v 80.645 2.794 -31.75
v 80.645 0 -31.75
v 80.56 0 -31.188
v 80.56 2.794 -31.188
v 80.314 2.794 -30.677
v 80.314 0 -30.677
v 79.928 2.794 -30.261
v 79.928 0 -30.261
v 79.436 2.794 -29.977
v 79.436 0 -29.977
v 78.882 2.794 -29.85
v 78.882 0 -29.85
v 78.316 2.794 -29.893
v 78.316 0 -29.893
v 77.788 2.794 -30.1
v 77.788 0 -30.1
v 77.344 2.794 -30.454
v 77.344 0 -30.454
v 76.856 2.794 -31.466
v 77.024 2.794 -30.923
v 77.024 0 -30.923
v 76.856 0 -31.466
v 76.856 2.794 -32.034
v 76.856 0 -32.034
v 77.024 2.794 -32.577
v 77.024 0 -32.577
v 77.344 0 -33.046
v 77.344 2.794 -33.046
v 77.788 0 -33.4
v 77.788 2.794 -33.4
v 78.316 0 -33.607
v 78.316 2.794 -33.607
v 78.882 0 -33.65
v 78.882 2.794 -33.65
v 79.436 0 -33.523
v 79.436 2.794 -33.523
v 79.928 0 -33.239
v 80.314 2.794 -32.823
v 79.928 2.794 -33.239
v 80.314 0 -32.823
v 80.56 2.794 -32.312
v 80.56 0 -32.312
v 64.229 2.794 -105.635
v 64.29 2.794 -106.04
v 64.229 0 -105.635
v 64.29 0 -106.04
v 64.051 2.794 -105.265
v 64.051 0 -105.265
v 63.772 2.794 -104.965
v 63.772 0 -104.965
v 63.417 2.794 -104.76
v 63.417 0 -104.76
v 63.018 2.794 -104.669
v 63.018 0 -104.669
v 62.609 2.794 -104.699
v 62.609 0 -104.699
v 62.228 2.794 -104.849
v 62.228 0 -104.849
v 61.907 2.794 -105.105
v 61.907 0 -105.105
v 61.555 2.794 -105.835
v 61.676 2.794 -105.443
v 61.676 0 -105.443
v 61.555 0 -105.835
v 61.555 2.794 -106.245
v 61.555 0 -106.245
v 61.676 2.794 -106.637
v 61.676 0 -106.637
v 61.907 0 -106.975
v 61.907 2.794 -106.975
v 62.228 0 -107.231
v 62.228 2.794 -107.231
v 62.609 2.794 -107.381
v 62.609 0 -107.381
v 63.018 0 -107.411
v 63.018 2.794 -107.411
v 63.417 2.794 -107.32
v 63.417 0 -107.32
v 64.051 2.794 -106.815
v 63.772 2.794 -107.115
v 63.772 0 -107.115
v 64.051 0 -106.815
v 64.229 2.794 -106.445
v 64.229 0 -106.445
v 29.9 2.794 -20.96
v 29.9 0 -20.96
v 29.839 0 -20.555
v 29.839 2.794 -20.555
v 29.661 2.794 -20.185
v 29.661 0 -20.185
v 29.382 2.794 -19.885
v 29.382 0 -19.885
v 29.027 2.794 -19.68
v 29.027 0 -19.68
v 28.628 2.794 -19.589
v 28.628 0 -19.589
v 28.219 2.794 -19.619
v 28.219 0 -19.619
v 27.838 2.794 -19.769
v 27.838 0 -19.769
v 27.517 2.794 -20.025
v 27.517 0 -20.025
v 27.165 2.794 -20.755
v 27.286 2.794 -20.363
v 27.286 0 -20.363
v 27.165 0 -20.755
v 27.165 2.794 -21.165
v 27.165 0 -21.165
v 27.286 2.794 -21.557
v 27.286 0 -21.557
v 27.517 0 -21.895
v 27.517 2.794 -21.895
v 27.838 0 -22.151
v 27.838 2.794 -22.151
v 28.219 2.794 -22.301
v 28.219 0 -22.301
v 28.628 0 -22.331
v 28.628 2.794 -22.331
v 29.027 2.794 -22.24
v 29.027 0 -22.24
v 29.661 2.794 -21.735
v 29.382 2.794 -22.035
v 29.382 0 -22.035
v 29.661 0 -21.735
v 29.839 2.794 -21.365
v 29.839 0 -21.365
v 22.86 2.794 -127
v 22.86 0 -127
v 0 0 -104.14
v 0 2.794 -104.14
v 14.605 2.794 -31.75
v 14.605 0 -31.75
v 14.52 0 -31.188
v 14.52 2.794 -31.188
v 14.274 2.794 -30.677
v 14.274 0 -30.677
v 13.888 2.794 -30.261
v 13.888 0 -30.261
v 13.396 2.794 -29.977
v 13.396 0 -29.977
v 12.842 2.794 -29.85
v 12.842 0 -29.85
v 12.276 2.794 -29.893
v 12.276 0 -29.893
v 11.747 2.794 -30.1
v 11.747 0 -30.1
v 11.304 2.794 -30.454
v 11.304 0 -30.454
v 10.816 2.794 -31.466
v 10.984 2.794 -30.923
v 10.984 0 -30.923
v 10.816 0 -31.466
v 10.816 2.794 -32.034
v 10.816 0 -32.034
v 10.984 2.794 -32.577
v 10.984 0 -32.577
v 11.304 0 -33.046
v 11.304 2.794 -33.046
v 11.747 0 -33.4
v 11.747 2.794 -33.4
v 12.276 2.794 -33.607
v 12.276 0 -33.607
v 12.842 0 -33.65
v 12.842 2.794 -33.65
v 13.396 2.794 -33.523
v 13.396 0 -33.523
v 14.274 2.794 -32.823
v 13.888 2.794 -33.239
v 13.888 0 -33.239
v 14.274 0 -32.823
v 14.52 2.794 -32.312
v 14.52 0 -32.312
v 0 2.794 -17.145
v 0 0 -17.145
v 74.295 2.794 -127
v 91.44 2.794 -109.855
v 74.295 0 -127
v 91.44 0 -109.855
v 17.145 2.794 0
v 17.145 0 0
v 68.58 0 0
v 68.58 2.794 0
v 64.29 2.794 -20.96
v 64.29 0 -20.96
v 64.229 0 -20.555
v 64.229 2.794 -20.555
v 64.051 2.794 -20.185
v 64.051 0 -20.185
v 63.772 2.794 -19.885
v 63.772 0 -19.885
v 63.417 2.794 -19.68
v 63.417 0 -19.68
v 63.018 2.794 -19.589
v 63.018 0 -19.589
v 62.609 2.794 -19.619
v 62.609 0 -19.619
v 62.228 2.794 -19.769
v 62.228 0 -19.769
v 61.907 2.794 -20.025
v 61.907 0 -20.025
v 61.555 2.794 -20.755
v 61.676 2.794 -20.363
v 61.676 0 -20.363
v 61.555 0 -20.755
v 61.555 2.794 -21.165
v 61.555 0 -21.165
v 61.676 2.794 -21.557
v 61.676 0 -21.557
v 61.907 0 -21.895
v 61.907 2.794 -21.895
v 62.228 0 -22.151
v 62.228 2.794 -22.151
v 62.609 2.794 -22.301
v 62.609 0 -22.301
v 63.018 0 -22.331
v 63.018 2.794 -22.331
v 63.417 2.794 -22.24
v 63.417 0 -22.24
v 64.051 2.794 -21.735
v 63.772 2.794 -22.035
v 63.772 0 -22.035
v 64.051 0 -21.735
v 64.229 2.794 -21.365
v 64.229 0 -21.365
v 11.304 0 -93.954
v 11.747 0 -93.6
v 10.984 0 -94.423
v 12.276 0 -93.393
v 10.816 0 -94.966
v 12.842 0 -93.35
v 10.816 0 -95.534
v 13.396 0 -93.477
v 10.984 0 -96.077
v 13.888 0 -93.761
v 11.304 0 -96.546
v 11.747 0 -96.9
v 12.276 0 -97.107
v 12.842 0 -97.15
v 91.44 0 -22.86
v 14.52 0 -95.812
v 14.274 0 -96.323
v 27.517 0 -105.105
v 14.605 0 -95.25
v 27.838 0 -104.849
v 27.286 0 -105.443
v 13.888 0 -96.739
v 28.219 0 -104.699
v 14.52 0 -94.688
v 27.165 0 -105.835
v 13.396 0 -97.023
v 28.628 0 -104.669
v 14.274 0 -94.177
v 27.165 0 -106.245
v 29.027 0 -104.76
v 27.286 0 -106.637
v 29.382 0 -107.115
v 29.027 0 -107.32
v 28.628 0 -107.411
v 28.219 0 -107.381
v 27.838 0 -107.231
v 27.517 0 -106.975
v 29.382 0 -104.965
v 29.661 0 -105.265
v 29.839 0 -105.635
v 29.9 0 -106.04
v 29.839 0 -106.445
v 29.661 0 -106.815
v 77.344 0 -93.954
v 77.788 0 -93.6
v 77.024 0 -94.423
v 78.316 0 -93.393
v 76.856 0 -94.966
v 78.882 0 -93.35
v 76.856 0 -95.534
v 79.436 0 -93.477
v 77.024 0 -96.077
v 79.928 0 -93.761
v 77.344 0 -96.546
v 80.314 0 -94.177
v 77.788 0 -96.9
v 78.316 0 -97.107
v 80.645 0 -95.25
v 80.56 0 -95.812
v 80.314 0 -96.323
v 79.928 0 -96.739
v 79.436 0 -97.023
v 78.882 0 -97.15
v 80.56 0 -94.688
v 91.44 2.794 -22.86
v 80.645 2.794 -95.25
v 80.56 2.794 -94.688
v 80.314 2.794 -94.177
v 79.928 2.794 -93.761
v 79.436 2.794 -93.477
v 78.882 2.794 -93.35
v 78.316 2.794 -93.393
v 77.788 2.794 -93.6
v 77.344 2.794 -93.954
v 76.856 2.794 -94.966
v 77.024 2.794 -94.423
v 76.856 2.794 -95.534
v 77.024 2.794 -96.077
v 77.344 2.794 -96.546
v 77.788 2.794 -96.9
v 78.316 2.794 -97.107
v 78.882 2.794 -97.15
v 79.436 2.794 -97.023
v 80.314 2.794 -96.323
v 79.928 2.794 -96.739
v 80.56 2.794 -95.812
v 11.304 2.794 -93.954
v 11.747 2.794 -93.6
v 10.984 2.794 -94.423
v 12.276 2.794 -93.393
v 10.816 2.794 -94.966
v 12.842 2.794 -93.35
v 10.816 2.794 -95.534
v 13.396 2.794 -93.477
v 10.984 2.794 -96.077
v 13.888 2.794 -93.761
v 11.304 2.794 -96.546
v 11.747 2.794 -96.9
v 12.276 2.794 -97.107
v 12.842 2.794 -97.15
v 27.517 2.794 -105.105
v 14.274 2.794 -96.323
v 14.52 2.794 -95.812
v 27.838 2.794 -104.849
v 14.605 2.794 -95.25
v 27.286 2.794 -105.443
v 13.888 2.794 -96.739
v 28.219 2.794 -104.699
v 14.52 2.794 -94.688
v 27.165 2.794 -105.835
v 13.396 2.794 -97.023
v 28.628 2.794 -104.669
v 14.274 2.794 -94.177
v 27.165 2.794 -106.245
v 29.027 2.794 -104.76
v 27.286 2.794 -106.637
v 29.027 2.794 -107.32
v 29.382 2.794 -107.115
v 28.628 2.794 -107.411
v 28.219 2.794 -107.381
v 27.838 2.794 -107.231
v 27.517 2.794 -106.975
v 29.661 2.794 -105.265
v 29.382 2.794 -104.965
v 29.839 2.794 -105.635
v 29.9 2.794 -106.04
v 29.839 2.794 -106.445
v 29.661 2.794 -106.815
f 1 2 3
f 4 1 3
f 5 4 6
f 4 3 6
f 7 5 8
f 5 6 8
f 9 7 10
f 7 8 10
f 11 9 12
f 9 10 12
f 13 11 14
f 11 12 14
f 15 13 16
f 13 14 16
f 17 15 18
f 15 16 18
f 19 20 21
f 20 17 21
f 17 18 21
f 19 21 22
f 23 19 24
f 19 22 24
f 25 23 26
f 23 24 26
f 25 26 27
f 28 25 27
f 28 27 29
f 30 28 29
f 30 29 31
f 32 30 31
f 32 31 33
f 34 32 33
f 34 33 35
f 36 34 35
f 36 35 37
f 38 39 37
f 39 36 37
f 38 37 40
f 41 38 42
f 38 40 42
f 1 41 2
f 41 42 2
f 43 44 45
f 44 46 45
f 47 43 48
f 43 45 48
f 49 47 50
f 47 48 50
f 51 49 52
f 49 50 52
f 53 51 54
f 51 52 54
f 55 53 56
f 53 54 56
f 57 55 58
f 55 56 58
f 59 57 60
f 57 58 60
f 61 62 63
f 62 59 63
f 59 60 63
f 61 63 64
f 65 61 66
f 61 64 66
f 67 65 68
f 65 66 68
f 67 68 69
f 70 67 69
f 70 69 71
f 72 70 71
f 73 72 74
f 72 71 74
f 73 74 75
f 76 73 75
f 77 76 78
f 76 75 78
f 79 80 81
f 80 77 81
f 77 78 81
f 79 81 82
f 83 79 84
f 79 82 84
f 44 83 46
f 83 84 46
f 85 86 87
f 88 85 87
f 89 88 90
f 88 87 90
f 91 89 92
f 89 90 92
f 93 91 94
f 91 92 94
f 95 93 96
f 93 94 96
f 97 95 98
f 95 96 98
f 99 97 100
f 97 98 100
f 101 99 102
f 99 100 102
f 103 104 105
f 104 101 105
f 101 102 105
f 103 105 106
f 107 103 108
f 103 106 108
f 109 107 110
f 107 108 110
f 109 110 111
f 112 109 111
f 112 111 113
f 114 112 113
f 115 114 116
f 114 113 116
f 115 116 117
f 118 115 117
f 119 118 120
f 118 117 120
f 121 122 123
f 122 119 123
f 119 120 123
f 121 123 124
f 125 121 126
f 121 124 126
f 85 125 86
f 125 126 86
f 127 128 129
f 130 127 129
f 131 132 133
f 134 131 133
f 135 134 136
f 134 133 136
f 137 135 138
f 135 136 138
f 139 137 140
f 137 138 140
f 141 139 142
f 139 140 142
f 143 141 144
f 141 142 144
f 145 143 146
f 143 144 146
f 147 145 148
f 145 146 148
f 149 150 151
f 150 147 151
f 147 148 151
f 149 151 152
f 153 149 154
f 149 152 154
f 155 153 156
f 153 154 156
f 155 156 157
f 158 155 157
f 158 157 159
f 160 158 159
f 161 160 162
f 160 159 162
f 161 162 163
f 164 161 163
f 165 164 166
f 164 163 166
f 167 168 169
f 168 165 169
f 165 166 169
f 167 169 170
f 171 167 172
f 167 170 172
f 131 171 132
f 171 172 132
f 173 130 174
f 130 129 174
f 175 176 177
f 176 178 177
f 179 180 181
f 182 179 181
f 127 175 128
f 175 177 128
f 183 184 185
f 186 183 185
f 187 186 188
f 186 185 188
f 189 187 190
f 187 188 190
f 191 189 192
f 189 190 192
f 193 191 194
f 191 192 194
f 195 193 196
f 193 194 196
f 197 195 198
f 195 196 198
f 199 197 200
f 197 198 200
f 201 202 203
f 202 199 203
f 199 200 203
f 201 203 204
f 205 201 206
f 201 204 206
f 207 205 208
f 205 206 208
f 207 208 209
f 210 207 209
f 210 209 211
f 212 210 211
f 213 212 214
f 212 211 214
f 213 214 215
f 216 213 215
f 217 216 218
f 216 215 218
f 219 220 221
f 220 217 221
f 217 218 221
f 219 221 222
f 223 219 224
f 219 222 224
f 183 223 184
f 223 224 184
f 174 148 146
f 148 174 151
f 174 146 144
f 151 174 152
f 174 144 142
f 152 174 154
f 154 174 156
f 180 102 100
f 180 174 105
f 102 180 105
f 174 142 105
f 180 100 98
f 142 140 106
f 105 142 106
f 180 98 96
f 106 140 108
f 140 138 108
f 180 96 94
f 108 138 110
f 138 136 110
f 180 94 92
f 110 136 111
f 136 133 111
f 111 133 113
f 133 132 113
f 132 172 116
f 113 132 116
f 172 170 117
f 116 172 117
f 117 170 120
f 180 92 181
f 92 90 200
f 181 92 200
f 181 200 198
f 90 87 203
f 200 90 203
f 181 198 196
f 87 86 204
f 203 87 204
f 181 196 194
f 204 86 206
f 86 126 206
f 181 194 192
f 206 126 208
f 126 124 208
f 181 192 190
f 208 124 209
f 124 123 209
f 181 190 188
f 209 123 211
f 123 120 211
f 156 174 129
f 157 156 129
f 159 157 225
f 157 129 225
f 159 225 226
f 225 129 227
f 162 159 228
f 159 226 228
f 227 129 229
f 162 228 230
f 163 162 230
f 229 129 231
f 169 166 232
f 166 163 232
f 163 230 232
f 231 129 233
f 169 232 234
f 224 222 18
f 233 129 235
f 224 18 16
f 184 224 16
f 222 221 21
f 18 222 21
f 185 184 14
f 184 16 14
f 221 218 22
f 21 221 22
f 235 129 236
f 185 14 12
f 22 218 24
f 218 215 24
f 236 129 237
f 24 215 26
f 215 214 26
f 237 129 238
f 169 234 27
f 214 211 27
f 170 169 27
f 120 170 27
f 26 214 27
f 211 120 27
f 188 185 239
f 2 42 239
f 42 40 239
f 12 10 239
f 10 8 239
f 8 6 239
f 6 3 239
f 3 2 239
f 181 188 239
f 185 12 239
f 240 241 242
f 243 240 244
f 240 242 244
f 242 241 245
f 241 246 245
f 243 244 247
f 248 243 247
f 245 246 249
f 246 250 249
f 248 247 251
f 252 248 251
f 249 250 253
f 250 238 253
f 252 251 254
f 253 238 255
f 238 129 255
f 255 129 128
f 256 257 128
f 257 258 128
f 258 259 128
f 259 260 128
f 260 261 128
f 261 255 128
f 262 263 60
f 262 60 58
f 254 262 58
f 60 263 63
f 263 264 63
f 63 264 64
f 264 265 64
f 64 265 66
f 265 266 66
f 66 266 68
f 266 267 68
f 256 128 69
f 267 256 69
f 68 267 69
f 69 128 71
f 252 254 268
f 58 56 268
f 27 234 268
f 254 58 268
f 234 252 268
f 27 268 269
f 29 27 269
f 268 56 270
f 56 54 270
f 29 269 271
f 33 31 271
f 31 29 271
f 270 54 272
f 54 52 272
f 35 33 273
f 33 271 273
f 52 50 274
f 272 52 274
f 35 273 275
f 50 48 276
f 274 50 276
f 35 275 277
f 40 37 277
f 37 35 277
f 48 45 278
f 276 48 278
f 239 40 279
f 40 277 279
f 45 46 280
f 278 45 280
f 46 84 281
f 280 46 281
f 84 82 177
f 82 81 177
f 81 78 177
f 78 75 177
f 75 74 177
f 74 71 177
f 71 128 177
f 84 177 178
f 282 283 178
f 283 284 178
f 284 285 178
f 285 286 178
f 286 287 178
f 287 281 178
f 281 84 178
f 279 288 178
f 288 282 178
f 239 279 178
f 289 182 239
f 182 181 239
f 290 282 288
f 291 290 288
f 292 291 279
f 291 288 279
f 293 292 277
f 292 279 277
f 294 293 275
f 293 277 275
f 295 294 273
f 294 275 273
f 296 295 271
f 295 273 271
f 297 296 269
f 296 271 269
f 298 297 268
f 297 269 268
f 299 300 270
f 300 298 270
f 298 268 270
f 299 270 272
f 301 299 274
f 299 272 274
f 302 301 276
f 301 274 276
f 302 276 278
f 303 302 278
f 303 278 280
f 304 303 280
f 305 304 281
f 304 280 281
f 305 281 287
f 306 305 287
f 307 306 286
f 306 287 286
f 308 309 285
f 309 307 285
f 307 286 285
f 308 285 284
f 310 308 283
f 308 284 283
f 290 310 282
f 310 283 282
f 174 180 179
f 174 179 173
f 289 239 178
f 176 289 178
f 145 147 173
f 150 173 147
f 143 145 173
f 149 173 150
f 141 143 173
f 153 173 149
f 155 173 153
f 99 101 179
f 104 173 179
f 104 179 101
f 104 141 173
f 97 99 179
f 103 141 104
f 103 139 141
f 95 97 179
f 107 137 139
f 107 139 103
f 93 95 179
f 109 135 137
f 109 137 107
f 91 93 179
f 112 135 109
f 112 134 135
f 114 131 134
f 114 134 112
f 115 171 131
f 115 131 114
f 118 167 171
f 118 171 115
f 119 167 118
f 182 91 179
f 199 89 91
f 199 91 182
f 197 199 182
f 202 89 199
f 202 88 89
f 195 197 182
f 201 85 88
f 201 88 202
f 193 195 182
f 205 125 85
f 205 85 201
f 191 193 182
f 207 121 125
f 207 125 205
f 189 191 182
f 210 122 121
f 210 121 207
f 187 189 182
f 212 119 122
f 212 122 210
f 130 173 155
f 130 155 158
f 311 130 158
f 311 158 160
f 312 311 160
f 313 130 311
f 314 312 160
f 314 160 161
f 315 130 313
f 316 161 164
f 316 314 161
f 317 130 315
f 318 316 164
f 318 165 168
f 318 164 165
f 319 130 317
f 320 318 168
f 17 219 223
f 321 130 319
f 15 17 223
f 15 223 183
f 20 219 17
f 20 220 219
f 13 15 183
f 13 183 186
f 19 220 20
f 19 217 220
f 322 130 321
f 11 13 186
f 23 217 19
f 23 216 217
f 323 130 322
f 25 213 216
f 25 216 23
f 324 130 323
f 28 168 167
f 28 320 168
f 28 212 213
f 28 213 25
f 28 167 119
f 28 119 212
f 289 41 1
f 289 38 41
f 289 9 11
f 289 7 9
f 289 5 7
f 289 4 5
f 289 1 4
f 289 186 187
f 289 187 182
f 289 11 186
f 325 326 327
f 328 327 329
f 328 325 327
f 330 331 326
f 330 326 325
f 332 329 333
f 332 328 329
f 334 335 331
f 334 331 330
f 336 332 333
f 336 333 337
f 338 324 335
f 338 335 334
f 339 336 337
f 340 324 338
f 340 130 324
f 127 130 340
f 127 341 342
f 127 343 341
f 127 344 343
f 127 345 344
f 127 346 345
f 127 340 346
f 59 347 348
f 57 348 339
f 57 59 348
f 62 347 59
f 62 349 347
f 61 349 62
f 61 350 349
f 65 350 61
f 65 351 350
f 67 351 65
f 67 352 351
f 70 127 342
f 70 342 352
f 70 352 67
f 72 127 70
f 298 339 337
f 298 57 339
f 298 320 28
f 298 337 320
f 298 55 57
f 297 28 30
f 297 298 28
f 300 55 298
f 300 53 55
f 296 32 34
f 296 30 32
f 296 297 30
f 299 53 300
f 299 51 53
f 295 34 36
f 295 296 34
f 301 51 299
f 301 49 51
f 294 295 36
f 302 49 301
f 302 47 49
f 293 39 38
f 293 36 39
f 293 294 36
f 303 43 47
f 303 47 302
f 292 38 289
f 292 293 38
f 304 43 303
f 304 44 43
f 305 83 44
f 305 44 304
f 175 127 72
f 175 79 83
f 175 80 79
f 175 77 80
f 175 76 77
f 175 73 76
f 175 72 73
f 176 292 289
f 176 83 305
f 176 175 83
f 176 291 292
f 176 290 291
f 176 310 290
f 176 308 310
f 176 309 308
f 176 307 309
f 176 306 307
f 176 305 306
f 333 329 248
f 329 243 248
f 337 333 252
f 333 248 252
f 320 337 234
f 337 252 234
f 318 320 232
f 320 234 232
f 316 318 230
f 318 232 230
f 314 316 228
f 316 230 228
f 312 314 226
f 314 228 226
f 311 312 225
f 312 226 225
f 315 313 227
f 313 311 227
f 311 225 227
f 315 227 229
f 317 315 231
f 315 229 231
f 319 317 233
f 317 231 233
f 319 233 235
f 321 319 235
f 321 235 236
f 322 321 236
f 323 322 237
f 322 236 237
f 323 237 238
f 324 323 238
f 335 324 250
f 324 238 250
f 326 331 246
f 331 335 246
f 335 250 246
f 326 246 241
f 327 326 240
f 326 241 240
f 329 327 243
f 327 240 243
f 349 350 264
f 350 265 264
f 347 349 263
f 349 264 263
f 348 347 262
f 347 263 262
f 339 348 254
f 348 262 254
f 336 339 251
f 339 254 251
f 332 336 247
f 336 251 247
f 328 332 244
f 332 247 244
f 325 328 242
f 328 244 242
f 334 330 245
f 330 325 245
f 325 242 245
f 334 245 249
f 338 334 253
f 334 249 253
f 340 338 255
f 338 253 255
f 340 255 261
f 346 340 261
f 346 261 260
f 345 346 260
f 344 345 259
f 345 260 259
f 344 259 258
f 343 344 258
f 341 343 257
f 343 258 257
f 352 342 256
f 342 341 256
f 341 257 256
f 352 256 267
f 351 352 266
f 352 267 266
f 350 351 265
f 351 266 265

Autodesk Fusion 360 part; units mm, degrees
sketch "Sketch1" plane through (0, 0, 0) normal (0, 1, 0) x (1, 0, 0)
  line L0 (17.145, 0) -> (68.58, 0)
  line L1 (91.44, 22.86) -> (91.44, 109.855)
  line L2 (74.295, 127) -> (22.86, 127)
  line L3 (0, 104.14) -> (0, 17.145)
  circle A0 centre (12.7, 31.75) radius 1.905
  circle A1 centre (78.74, 95.25) radius 1.905
  circle A2 centre (78.74, 31.75) radius 1.905
  circle A3 centre (12.7, 95.25) radius 1.905
  circle A4 centre (28.525, 20.96) radius 1.375
  circle A5 centre (62.915, 20.96) radius 1.375
  circle A6 centre (62.915, 106.04) radius 1.375
  circle A7 centre (28.525, 106.04) radius 1.375
  line L4 (22.86, 127) -> (0, 104.14)
  line L5 (91.44, 109.855) -> (74.295, 127)
  line L6 (68.58, 0) -> (91.44, 22.86)
  line L7 (17.145, 0) -> (0, 17.145)
  point P0 (91.44, 0)
  point P1 (91.44, 127)
  point P2 (0, 127)
  dimension "d1" = 91.44
  dimension "d8" = 2.75
  dimension "d63" = 22.86
  dimension "d64" = 22.86
  dimension "d65" = 17.145
  dimension "d66" = 17.145
  dimension "d67" = 22.86
  dimension "d68" = 22.86
  dimension "d69" = 17.145
  dimension "d70" = 17.145
extrude "Extrude5" add sketch "Sketch1" along normal blind 2.794
equation "d64 = d63"
equation "d66 = d65"
equation "d68 = d67"
equation "d70 = d69"
